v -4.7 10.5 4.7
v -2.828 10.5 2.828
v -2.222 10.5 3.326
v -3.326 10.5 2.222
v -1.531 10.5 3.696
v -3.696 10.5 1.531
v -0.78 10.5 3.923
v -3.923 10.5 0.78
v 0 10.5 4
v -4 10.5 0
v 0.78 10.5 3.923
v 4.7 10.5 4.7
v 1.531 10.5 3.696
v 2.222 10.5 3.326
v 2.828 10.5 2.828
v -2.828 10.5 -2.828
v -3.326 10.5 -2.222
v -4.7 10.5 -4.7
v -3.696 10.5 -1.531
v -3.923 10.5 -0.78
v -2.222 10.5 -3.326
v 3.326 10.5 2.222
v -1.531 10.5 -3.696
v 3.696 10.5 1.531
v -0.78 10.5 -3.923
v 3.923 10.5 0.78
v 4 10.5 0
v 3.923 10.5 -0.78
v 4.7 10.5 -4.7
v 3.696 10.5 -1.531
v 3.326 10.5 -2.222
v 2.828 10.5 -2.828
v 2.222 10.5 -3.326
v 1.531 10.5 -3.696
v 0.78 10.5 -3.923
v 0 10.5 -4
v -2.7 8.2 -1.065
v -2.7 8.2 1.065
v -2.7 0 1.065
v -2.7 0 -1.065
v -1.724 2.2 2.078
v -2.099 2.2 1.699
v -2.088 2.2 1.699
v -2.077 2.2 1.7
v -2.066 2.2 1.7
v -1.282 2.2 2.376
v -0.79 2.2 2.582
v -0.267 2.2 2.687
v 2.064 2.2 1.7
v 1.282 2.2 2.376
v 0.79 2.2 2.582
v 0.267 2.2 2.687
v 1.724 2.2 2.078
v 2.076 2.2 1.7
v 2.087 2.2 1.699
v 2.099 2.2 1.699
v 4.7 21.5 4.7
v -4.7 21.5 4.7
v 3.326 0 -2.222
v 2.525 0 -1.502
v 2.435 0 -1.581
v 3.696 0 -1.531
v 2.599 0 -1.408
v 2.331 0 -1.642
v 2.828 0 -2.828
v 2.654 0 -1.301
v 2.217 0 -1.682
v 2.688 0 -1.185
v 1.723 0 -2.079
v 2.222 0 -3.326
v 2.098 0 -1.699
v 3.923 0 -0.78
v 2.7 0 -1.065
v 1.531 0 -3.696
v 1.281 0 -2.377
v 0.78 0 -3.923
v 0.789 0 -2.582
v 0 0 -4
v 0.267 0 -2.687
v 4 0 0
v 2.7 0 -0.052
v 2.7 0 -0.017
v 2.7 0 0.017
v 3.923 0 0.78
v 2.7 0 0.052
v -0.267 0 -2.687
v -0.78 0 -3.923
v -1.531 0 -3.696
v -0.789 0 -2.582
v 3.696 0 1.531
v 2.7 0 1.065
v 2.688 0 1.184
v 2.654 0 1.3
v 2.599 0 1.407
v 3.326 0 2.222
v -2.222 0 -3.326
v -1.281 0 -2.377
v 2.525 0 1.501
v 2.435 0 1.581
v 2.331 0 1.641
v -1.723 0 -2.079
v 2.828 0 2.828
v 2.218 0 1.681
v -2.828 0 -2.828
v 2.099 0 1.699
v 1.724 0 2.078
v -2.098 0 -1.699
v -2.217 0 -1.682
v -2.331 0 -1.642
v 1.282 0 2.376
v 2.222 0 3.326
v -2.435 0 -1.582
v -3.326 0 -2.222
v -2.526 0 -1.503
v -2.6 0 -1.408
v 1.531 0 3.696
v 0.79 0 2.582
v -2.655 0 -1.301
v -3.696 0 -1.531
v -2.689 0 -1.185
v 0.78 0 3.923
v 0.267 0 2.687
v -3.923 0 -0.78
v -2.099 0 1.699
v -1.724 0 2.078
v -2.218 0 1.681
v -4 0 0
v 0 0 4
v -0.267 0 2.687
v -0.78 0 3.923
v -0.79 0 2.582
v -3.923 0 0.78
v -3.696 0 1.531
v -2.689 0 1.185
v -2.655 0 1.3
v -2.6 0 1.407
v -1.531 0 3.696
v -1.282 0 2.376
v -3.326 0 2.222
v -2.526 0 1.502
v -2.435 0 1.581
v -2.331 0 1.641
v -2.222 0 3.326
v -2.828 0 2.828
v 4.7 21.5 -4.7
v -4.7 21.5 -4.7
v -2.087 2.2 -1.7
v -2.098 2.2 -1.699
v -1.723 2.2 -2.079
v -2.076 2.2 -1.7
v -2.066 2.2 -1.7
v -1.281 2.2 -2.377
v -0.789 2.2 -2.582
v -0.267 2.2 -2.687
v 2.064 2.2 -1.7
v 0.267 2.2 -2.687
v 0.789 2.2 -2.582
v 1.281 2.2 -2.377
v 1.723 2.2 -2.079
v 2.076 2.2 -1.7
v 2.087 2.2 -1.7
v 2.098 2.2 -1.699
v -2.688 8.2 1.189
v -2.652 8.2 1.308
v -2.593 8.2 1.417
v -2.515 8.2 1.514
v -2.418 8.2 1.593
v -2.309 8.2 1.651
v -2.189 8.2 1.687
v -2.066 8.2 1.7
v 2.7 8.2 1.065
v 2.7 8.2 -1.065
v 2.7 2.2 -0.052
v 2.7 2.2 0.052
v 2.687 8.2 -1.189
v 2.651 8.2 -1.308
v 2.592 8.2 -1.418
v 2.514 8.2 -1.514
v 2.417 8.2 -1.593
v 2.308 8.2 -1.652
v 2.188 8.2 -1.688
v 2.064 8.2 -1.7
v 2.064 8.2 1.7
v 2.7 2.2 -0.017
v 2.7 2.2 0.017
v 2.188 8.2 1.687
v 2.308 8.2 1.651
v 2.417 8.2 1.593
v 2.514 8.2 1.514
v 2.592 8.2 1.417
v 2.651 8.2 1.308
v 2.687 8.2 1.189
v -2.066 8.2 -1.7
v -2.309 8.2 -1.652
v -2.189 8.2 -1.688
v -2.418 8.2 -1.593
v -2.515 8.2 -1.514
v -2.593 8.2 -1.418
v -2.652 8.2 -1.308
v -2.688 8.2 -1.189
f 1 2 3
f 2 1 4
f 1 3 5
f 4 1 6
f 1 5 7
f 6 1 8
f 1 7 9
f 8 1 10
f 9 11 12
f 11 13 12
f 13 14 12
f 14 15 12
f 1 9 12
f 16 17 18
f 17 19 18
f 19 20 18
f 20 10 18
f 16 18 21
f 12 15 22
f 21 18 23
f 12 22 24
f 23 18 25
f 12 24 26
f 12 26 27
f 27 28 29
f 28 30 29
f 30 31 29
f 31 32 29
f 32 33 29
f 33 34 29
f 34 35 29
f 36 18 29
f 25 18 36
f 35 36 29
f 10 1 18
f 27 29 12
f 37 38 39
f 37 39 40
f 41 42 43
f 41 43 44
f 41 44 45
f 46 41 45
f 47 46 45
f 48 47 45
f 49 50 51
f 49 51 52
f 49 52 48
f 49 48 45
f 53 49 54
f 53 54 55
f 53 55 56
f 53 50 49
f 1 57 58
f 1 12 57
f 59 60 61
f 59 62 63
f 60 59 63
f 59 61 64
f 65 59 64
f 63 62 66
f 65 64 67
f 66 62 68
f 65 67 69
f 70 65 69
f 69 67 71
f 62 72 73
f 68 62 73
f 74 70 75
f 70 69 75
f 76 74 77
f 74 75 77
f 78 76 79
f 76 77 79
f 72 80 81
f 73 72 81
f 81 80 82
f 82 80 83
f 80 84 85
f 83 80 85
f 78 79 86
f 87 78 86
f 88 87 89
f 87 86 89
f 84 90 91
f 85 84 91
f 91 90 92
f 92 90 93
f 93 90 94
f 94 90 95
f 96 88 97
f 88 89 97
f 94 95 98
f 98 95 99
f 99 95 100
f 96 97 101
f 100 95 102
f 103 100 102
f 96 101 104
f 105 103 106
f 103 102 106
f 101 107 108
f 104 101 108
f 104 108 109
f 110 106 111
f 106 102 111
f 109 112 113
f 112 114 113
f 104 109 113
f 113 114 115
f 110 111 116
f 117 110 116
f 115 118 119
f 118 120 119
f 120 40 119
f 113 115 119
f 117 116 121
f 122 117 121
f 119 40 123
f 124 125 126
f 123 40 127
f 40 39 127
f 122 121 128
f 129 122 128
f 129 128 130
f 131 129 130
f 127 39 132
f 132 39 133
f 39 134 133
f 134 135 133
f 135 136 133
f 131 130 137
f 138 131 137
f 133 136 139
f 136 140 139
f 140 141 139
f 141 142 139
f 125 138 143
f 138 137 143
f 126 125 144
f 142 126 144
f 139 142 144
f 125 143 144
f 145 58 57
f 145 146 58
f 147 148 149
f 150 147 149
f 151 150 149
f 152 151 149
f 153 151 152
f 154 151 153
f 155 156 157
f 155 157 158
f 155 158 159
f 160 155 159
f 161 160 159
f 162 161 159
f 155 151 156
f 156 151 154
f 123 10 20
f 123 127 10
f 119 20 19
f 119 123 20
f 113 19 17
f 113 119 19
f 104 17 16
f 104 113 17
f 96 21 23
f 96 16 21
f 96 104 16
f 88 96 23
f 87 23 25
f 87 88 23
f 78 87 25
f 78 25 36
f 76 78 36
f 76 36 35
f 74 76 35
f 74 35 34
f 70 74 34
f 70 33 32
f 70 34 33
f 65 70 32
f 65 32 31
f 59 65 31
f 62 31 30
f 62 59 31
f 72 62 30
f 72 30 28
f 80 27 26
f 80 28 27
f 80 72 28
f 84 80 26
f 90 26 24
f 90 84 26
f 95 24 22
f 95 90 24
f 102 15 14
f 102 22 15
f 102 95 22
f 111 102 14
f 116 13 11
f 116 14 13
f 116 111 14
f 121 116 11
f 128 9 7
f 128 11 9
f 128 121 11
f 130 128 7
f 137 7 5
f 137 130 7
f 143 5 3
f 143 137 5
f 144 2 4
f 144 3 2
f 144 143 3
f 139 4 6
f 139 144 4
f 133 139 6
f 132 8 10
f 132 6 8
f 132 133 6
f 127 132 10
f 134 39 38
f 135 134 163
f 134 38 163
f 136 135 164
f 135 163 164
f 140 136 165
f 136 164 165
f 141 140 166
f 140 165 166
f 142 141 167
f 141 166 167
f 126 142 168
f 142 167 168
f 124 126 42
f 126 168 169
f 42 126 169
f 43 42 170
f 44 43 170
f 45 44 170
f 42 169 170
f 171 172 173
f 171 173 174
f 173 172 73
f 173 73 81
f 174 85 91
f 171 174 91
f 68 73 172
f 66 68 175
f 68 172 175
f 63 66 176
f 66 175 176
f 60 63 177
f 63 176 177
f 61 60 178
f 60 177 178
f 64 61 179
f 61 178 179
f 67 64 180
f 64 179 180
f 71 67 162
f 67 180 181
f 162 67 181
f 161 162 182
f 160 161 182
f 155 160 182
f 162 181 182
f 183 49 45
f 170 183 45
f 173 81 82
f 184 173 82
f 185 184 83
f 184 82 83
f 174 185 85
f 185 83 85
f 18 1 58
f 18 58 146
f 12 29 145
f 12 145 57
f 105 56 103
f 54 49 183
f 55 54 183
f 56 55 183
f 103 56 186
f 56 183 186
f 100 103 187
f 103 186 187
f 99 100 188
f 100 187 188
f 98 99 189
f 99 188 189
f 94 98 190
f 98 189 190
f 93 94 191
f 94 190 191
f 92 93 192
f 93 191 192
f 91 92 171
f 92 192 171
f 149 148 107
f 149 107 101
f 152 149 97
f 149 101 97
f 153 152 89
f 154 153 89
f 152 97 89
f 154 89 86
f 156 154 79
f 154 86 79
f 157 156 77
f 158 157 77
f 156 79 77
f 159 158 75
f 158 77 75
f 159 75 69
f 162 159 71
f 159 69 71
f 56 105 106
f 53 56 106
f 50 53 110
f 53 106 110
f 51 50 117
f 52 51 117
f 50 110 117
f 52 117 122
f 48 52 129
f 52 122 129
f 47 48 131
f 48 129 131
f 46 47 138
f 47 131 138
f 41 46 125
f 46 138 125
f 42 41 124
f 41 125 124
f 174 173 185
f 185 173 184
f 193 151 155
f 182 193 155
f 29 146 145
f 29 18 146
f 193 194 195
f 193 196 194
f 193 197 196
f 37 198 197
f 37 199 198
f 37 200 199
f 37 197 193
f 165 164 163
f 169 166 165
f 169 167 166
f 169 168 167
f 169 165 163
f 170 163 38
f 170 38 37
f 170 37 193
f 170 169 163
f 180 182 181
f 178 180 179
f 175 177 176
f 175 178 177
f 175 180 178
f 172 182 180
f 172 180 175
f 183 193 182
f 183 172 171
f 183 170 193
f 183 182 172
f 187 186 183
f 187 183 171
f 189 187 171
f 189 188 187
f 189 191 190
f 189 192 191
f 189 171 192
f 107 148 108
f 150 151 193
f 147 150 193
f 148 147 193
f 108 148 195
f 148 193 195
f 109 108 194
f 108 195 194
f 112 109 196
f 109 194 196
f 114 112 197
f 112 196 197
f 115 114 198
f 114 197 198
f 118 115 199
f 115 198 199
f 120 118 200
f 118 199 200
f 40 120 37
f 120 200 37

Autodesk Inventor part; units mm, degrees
ref_plane "YZ Plane" through (0, 0, 0) normal (1, 0, 0) x (0, 1, 0)
ref_plane "XZ Plane" through (0, 0, 0) normal (0, 1, 0) x (-1, 0, 0)
ref_plane "XY Plane" through (0, 0, 0) normal (0, 0, 1) x (1, 0, 0)
sketch "Sketch1" plane through (0, 0, 0) normal (0, 1, 0) x (-1, 0, 0)
  line L0 (14.5, -14.5) -> (-14.5, -14.5)
  line L1 (-14.5, -14.5) -> (-14.5, 14.5)
  line L2 (-14.5, 14.5) -> (14.5, 14.5)
  line L3 (14.5, 14.5) -> (14.5, -14.5)
  circle A0 centre (0, 0) radius 4
  dimension "d11" = 29
  dimension "d14" = 29
  dimension "d31" = 8
extrude "Extrusion1" add sketch "Sketch1" along normal blind 10.5 contours A0
sketch "Sketch2" plane through (0, 10.5, 0) normal (0, 1, 0) x (1, 0, 0)
  line L0 (-4.7, 4.7) -> (4.7, 4.7)
  line L1 (4.7, 4.7) -> (4.7, -4.7)
  line L2 (4.7, -4.7) -> (-4.7, -4.7)
  line L3 (-4.7, -4.7) -> (-4.7, 4.7)
  line L4 (14.5, 14.5) -> (-14.5, 14.5) projected
  line L5 (14.5, -14.5) -> (14.5, 14.5) projected
  line L6 (-14.5, -14.5) -> (14.5, -14.5) projected
  line L7 (-14.5, 14.5) -> (-14.5, -14.5) projected
  point P0 (0, 0)
  dimension "d15" = 9.8
  dimension "d16" = 9.8
  dimension "d17" = 9.8
  dimension "d18" = 9.8
  dimension "d32" = 9.4
  dimension "d50" = 29
extrude "Extrusion2" add sketch "Sketch2" along normal blind 11 contours L0 L1 L2 L3
sketch "Sketch3" plane through (0, 0, 0) normal (0, -1, 0) x (1, 0, 0)
  line L0 (-0.0005, -0.0003) -> (-0.0005, -1.7003)
  line L1 (-0.0005, -1.7003) -> (2.6995, -1.7003)
  line L2 (2.6995, -1.7003) -> (2.6995, 1.6997)
  line L3 (2.6995, 1.6997) -> (-2.7005, 1.6997)
  line L4 (-2.7005, 1.6997) -> (-2.7005, -1.7003)
  line L5 (-2.7005, -1.7003) -> (-0.0005, -1.7003)
  dimension "d42" = 1.7
  dimension "d43" = 2.7
  dimension "d44" = 3.4
  dimension "d45" = 5.4
extrude "Extrusion3" cut sketch "Sketch3" against normal blind 8.2
sketch "Sketch5" plane through (0, 0, 0) normal (0, -1, 0) x (1, 0, 0)
  circle A0 centre (0, 0) radius 2.7
  dimension "d35" = 5.4
extrude "Extrusion4" cut sketch "Sketch5" against normal blind 2.2
fillet "Fillet1" radius 0.635 4 edges at (2.6995, 4.1, 1.6997) (2.6995, 4.1, -1.7003) (-2.7005, 4.1, -1.7003) (-2.7005, 4.1, 1.6997)
equation "\"d14\" = d11"
equation "\"d16\" = d15"
equation "\"d17\" = d15"
equation "\"d18\" = d15"
equation "\"d42\" = 0.5 * d44"
properties part number "Motor_Key_Bearing_2_2"
